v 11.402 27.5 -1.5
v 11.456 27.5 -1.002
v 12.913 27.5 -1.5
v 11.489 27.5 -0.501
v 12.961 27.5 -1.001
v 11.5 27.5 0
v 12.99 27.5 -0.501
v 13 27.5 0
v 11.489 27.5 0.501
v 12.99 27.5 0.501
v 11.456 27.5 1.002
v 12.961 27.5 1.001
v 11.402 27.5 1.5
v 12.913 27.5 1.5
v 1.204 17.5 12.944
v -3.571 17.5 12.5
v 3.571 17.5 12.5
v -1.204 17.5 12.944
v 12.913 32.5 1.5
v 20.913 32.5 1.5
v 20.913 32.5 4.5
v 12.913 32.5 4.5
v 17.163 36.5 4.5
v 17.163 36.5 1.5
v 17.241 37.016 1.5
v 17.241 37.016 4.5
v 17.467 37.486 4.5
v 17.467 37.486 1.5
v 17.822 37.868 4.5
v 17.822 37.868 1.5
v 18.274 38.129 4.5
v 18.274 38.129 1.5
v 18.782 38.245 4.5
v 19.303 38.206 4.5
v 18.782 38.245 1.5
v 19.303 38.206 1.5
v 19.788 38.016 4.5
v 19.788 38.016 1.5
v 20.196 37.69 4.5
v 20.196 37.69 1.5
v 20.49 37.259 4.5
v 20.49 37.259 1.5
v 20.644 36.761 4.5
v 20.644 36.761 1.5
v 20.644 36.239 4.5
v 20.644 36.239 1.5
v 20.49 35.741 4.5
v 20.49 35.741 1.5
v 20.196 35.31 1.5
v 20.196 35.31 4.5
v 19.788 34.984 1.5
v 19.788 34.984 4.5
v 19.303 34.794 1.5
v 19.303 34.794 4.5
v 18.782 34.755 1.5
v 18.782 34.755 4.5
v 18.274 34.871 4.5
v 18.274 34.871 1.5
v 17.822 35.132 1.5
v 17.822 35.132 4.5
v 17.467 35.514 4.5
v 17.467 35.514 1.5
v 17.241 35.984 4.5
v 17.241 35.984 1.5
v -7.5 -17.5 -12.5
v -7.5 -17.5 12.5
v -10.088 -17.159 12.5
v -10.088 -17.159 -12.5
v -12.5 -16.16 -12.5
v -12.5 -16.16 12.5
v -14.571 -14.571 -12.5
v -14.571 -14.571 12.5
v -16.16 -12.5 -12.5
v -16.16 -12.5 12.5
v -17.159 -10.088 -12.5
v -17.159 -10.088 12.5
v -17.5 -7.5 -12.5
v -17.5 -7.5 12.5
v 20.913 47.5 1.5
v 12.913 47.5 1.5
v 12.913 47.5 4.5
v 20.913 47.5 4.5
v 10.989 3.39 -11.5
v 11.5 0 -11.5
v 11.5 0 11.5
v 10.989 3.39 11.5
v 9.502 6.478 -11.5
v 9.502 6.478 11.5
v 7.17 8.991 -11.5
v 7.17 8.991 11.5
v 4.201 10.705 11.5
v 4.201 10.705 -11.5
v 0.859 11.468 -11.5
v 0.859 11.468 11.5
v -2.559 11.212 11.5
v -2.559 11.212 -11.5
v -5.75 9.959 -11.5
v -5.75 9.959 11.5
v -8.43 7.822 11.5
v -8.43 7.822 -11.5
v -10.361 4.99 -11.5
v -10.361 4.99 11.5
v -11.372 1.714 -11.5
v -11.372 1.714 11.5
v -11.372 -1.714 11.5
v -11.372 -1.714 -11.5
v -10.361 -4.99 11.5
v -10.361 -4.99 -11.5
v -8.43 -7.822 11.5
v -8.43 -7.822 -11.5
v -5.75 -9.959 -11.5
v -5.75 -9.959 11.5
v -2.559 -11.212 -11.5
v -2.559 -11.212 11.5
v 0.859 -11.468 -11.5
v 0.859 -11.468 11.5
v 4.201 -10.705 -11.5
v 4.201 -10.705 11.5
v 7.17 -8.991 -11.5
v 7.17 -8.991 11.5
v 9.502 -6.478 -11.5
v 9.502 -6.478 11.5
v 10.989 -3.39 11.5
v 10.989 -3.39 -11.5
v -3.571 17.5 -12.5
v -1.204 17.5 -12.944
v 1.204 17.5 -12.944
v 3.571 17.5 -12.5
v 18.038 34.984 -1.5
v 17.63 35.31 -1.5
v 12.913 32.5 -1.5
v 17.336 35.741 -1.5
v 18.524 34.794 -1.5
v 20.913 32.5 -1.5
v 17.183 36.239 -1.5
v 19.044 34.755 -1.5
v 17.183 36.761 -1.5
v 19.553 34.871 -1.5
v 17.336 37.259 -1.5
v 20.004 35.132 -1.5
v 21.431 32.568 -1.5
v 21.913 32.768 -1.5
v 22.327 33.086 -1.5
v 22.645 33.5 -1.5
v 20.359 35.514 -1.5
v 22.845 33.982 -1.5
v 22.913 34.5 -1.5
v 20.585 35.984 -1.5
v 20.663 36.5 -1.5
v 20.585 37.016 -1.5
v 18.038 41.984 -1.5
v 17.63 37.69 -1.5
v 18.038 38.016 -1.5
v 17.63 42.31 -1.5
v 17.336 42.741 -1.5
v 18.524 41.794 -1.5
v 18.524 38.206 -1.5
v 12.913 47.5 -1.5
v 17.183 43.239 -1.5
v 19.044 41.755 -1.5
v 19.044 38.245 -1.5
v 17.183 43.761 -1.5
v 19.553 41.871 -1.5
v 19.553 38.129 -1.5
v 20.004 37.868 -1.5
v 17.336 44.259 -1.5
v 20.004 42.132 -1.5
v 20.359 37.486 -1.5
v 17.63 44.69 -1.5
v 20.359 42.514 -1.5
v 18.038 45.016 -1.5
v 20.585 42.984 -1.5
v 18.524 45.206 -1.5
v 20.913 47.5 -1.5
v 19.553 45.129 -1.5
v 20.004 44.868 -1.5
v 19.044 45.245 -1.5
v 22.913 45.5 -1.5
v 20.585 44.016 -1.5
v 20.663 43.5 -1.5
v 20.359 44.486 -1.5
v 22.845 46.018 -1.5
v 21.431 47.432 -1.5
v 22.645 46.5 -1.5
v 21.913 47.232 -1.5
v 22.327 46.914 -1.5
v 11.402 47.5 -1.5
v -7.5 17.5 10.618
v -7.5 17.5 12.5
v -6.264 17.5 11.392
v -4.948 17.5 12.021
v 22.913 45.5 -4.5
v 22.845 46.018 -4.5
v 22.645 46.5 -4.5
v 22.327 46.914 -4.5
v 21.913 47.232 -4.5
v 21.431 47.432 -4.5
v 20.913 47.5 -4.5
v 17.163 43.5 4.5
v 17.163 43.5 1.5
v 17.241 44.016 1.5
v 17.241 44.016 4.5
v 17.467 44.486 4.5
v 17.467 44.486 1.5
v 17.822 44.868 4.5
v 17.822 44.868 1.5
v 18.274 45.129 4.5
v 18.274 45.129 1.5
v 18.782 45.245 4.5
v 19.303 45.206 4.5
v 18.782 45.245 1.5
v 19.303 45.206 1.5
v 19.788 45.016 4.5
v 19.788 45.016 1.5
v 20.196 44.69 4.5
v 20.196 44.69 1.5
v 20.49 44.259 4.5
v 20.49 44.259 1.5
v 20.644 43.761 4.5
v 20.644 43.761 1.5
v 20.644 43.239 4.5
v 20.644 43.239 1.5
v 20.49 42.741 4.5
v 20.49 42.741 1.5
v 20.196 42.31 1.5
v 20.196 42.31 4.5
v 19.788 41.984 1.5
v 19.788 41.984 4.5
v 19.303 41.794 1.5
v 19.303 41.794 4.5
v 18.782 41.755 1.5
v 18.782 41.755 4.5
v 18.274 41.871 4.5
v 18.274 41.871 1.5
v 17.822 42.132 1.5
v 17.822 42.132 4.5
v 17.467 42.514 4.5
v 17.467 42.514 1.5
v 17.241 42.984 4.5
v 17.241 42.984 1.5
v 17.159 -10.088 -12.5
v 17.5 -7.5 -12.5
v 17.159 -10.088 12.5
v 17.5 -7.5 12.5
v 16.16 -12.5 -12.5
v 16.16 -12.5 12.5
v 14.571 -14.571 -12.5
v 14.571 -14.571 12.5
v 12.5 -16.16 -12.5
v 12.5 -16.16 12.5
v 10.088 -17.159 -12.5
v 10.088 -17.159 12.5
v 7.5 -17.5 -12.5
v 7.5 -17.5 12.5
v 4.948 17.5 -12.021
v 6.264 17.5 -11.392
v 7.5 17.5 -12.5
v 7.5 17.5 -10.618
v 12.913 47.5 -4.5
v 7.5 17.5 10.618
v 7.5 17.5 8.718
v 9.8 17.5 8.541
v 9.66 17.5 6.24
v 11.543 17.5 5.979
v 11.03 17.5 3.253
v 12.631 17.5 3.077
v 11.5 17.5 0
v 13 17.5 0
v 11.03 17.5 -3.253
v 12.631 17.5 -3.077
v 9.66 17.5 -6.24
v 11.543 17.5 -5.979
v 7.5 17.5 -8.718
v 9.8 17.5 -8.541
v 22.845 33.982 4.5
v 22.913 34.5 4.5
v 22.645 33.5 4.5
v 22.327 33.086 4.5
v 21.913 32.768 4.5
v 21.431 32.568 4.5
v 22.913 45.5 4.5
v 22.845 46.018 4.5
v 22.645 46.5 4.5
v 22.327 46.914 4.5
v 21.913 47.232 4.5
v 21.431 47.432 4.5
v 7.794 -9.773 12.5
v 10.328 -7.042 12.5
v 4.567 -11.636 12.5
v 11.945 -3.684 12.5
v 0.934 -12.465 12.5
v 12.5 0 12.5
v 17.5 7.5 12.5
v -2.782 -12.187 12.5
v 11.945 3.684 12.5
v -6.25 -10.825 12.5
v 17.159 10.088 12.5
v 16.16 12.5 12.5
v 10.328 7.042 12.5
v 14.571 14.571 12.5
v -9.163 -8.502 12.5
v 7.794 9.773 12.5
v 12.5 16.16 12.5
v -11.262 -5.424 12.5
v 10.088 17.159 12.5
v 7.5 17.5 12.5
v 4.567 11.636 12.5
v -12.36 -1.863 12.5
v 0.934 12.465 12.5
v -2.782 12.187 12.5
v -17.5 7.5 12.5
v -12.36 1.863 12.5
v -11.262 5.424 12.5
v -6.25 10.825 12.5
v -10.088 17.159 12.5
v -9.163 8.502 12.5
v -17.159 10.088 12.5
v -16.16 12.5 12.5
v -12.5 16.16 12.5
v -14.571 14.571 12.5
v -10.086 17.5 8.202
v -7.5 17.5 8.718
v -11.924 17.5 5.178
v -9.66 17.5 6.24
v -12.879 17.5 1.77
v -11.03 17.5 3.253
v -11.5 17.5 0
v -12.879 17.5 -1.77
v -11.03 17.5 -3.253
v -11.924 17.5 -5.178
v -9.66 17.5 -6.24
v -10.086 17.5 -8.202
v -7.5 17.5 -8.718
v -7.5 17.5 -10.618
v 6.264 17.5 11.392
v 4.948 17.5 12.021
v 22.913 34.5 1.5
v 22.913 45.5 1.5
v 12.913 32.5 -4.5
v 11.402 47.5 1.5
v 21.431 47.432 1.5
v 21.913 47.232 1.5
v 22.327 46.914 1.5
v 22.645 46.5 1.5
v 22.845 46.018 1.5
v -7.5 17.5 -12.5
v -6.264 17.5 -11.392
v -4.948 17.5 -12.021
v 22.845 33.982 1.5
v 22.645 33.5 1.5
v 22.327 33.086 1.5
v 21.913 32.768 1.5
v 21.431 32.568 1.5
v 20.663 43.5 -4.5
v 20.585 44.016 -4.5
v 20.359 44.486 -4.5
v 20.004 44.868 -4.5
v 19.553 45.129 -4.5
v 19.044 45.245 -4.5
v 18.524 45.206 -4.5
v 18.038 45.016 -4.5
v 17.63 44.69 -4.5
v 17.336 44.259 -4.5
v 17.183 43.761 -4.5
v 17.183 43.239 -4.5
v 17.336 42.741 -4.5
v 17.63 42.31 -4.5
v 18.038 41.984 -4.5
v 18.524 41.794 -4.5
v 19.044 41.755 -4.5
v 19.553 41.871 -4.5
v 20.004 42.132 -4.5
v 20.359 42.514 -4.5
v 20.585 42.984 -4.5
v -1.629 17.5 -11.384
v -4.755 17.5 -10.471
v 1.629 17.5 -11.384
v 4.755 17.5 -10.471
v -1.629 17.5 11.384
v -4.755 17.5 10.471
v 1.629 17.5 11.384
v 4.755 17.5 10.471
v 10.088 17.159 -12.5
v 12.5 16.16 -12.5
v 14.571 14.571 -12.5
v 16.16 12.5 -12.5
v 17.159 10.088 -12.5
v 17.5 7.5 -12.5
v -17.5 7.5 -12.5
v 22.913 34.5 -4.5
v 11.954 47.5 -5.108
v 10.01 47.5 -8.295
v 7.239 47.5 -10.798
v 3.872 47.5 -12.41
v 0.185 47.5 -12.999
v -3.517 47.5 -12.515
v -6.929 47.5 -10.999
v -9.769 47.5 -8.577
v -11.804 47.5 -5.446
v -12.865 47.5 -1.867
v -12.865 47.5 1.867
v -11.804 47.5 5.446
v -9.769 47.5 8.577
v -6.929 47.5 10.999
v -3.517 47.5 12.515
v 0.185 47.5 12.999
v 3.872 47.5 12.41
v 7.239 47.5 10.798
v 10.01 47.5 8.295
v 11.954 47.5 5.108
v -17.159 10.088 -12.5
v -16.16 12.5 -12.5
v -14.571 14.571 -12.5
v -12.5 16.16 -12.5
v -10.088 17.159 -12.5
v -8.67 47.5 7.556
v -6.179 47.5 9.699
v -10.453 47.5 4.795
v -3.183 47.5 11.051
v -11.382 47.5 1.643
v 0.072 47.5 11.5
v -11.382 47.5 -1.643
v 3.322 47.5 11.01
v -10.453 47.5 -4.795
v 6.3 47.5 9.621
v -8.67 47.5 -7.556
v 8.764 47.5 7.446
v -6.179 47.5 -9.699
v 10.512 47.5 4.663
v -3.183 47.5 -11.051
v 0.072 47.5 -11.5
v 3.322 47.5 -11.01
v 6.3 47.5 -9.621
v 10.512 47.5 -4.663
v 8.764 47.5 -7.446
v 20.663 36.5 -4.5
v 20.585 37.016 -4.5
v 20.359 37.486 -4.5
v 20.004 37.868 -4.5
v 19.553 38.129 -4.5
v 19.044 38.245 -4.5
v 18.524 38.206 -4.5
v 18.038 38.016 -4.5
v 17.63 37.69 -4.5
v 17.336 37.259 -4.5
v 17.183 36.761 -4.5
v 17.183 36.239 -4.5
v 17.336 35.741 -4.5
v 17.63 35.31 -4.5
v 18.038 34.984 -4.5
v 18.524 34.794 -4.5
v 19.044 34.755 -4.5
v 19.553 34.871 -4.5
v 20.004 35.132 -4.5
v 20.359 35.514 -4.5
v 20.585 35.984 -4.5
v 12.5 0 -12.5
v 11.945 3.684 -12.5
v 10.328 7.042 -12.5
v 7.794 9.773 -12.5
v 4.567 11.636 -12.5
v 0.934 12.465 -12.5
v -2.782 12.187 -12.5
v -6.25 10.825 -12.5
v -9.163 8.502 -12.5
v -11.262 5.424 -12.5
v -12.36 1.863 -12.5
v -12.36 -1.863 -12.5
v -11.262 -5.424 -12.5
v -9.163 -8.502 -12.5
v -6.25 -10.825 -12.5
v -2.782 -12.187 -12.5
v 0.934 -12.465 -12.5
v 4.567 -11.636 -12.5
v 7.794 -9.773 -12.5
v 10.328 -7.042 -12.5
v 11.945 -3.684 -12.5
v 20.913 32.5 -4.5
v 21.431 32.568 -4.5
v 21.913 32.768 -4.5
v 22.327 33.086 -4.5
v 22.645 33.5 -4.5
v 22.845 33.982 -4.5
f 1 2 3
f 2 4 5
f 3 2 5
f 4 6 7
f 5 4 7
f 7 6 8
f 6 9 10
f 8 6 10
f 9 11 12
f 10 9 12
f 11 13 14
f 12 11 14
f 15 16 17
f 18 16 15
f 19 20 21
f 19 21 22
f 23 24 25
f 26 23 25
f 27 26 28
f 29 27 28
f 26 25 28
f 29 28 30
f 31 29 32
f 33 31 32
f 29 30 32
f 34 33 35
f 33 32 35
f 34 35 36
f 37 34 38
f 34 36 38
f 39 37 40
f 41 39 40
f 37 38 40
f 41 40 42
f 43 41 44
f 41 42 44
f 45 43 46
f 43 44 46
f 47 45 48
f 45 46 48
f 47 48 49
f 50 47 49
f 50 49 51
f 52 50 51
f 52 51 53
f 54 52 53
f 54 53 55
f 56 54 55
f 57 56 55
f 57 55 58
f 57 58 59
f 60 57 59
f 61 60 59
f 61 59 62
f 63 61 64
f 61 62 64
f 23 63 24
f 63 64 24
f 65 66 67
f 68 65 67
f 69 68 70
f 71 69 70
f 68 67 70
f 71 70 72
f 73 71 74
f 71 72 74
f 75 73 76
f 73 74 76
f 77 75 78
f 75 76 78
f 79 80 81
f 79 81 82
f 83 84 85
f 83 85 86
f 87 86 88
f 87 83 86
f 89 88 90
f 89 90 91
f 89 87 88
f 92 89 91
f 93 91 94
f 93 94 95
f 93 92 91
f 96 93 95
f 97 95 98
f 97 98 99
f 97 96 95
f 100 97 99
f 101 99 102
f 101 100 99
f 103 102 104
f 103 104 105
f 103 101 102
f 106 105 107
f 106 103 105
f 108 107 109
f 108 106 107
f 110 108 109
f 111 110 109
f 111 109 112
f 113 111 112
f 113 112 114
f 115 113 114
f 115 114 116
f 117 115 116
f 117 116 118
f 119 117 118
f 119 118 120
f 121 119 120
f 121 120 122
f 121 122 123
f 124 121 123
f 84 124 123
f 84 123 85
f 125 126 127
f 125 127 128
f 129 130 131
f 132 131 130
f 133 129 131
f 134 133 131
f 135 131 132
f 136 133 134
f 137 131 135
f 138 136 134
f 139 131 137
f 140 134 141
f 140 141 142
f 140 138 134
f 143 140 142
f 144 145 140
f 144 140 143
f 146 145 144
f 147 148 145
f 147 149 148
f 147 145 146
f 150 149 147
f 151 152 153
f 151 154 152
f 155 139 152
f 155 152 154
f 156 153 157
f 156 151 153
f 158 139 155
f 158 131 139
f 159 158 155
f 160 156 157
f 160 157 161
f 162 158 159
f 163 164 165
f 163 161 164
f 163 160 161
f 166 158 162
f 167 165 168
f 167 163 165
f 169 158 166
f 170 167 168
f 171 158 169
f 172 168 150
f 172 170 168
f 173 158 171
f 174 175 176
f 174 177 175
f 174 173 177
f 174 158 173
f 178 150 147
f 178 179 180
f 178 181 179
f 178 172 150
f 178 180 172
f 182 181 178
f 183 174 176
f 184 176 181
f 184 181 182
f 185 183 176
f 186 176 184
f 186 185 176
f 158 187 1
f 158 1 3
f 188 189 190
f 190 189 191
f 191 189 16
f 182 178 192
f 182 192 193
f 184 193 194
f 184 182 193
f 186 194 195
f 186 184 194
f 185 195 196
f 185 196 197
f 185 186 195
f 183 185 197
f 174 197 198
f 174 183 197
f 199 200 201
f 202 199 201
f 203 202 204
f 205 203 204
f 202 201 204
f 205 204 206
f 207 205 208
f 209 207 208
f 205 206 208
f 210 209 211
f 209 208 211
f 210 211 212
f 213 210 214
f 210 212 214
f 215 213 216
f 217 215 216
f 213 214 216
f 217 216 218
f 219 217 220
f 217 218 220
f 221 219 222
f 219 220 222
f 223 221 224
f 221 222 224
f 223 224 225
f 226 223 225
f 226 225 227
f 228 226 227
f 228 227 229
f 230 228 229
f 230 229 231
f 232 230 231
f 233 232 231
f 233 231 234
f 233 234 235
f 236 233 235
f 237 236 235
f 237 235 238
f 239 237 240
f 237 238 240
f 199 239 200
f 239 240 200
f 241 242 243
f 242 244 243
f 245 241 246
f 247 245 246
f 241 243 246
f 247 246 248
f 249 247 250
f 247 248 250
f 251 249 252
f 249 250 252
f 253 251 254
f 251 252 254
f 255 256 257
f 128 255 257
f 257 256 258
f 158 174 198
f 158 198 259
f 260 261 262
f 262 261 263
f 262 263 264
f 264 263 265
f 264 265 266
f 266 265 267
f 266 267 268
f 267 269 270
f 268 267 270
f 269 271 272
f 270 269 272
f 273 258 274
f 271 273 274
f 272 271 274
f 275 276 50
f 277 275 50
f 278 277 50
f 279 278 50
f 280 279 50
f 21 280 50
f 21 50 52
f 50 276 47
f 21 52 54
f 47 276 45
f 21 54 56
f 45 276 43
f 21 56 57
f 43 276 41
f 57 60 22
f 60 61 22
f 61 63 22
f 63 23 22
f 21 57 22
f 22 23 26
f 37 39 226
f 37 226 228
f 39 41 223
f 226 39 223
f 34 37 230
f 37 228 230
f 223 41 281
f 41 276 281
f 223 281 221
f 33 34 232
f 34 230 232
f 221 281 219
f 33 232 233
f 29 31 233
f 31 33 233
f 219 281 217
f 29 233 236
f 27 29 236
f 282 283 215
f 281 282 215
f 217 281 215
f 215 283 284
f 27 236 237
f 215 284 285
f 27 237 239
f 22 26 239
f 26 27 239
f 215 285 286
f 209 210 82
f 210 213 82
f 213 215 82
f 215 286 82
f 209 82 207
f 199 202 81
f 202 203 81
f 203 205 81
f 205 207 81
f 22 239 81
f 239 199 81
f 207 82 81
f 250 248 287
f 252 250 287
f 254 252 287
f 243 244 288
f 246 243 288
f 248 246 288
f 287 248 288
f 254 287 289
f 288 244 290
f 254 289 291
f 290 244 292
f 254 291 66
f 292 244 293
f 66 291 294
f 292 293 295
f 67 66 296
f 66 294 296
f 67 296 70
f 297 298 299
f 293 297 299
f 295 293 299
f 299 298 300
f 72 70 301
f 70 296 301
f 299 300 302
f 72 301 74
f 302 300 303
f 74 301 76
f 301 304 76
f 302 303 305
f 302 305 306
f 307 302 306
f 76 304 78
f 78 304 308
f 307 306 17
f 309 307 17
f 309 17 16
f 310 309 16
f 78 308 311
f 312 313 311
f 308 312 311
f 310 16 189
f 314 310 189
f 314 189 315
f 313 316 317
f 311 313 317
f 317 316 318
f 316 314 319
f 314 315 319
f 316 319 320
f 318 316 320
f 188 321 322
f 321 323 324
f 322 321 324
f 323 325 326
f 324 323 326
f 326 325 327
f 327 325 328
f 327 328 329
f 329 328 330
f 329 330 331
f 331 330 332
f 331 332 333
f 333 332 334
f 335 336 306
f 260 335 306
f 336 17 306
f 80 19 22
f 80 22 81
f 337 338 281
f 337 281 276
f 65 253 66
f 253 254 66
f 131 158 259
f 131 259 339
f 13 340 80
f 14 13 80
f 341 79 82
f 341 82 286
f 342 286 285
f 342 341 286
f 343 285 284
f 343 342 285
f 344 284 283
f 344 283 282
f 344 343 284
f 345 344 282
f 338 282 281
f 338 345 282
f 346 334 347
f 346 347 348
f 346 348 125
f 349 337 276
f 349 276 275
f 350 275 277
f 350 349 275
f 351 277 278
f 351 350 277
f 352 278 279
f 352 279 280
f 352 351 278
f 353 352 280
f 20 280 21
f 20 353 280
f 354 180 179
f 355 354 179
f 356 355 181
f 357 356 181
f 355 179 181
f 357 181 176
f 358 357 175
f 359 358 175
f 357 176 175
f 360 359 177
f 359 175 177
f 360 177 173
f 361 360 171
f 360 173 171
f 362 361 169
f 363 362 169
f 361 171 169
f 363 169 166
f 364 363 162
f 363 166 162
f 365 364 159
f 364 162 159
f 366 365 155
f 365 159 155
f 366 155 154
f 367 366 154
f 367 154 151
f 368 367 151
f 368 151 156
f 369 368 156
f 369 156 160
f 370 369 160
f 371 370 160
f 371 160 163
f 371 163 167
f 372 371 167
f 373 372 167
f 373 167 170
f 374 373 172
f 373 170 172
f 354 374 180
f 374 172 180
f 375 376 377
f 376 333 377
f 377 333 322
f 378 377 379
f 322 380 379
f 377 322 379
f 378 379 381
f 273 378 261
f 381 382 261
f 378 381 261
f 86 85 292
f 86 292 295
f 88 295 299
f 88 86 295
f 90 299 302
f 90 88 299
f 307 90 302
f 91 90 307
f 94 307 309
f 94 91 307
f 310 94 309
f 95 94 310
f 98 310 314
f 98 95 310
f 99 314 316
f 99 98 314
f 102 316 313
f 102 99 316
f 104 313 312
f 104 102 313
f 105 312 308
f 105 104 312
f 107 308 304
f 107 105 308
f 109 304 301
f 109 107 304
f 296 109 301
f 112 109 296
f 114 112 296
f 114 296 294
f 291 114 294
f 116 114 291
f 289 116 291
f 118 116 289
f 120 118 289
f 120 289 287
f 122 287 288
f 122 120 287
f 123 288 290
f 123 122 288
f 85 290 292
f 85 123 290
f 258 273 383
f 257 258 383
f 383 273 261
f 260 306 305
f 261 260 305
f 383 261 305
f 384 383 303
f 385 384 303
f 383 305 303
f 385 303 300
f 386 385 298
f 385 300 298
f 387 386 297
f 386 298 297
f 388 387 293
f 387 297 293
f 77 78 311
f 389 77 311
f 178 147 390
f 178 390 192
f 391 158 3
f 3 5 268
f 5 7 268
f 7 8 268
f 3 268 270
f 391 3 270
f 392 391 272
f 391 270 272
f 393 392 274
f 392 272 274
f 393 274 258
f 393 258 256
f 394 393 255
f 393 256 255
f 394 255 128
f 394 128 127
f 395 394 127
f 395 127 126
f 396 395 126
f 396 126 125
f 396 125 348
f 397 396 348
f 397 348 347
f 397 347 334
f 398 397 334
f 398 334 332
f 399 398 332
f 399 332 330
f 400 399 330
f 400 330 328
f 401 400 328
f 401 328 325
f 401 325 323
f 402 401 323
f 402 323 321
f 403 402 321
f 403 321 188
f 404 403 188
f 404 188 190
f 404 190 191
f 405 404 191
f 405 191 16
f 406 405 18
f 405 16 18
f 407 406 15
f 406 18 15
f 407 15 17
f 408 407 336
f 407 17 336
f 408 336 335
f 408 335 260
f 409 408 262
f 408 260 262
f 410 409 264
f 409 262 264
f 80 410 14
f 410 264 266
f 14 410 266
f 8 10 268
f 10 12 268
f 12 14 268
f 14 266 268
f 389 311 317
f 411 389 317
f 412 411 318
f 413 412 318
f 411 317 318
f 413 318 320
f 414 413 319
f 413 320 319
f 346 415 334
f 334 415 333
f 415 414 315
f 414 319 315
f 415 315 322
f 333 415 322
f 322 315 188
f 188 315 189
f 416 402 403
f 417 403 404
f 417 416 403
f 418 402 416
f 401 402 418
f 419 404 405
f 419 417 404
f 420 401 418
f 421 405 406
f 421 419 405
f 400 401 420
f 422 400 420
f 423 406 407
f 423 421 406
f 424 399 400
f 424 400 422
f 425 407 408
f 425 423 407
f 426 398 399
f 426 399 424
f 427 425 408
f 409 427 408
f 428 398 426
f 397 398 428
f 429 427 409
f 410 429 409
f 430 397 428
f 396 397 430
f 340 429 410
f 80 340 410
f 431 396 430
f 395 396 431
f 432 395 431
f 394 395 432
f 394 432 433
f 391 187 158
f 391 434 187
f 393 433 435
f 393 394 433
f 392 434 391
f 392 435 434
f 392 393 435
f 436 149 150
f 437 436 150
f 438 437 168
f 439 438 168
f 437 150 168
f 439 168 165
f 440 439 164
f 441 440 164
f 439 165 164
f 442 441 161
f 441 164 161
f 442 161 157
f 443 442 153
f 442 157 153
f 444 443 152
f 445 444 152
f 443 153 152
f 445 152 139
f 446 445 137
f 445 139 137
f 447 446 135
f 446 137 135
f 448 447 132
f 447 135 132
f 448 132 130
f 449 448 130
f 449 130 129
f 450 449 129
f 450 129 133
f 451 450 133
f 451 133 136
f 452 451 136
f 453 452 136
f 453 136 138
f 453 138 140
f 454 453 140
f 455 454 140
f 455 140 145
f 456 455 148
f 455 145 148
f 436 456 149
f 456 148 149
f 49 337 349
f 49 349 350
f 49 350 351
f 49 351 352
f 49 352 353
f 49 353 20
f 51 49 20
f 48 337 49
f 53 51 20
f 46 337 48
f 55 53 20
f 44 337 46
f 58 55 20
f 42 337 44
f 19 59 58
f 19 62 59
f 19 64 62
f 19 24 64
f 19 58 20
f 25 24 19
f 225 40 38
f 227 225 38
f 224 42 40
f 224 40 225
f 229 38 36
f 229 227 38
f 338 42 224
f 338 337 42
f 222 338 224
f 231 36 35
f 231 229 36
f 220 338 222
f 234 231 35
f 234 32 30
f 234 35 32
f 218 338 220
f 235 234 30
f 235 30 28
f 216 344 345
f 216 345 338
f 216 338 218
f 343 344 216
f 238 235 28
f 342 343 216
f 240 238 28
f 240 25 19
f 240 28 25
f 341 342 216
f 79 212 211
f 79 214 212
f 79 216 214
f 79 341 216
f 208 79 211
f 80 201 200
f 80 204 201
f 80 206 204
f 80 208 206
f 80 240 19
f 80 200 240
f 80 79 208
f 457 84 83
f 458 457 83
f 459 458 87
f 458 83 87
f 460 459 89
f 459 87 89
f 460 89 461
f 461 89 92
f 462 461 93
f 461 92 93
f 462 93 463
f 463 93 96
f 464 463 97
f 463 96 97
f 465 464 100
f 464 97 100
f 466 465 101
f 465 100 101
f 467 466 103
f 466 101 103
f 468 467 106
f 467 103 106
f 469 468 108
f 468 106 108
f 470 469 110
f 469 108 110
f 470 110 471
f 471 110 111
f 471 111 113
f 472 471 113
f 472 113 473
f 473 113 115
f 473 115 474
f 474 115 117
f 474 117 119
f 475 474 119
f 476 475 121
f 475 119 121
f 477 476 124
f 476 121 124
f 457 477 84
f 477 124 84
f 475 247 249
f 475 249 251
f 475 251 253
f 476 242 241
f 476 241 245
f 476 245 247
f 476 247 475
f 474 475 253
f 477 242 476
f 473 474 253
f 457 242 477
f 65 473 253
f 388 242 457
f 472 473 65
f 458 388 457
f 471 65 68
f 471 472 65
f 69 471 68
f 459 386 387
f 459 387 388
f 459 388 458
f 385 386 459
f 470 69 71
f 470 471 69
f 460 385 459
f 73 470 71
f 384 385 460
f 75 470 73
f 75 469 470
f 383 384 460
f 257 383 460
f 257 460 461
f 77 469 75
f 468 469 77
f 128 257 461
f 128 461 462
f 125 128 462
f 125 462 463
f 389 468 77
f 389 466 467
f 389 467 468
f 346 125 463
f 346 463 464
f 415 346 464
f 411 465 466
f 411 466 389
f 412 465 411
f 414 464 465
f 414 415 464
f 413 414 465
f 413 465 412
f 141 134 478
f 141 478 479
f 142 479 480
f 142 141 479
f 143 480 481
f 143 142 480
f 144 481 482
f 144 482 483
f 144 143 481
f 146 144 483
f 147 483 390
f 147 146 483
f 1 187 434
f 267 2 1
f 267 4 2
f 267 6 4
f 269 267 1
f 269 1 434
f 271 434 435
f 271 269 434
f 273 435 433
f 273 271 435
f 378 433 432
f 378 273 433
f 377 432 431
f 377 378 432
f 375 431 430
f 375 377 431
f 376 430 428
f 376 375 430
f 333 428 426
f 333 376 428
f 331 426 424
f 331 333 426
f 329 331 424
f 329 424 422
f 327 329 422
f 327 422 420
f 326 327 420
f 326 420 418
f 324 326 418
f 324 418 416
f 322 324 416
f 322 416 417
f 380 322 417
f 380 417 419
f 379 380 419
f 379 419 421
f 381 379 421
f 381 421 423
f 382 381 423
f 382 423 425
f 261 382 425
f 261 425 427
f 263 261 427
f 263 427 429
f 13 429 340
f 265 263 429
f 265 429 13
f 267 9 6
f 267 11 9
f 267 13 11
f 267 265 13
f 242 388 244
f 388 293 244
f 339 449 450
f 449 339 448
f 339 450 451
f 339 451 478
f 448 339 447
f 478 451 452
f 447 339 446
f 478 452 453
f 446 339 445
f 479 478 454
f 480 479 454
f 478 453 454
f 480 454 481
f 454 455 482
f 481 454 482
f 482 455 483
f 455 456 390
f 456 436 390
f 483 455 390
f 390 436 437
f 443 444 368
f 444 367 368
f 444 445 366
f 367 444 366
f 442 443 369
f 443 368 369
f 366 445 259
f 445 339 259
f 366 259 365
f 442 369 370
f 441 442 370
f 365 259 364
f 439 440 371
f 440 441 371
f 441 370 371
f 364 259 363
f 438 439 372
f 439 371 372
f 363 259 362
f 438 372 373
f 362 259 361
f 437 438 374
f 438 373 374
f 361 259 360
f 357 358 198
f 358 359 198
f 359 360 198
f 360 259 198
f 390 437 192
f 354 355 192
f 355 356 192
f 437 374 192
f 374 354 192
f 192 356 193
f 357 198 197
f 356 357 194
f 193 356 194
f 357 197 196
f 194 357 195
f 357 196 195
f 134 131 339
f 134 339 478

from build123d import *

# Parameters (mm, degrees)
SKETCH1_R           = 11.5
BOSS_EXTRUDE2_DEPTH = 12.5
SKETCH4_R           = 13
SKETCH4_R_2         = 11.5
BOSS_EXTRUDE3_DEPTH = 30
SKETCH5_W           = 11.805491749
SKETCH5_H           = 20
CUT_EXTRUDE1_DEPTH  = 1.5
SKETCH7_R           = 1.75
BOSS_EXTRUDE4_DEPTH = 3
SKETCH8_R           = 1.75
BOSS_EXTRUDE6_DEPTH = 3
CHAMFER1_SIZE       = 1


with BuildPart() as part:
    # Sketch1 → Boss-Extrude2 (new body, symmetric)
    with BuildSketch(Plane.XY):
        with BuildLine():
            Line((-7.5, 17.5), (7.5, 17.5))
            ThreePointArc((7.5, 17.5), (14.571067812, 14.571067812), (17.5, 7.5))
            Line((17.5, 7.5), (17.5, -7.5))
            ThreePointArc((17.5, -7.5), (14.571067812, -14.571067812), (7.5, -17.5))
            Line((7.5, -17.5), (-7.5, -17.5))
            ThreePointArc((-7.5, -17.5), (-14.571067812, -14.571067812), (-17.5, -7.5))
            Line((-17.5, -7.5), (-17.5, 7.5))
            ThreePointArc((-17.5, 7.5), (-14.571067812, 14.571067812), (-7.5, 17.5))
        make_face()
        Circle(SKETCH1_R, mode=Mode.SUBTRACT)
    extrude(amount=BOSS_EXTRUDE2_DEPTH, both=True)

    # Sketch4 → Boss-Extrude3 (add)
    with BuildSketch(Plane(origin=(0, 17.5, 0), x_dir=(1, 0, 0), z_dir=(0, 1, 0))):
        Circle(SKETCH4_R)
        Circle(SKETCH4_R_2, mode=Mode.SUBTRACT)
    extrude(amount=BOSS_EXTRUDE3_DEPTH)

    # Sketch5 → Cut-Extrude1 (cut, symmetric)
    with BuildSketch(Plane.XY):
        with Locations((11.85964538, 37.5)):
            Rectangle(SKETCH5_W, SKETCH5_H)
    extrude(amount=CUT_EXTRUDE1_DEPTH, both=True, mode=Mode.SUBTRACT)

    # Chamfer1
    chamfer1_edges = [part.edges().sort_by_distance(p)[0] for p in [
        (-11.5, 0, -12.5),
        (-11.5, 0, 12.5),
    ]]
    chamfer(chamfer1_edges, length=CHAMFER1_SIZE)


with BuildPart() as body_2:
    # Sketch7 → Boss-Extrude4 (new body)
    with BuildSketch(Plane(origin=(0, 0, 1.5), x_dir=(-1, 0, 0), z_dir=(0, 0, -1))):
        with BuildLine():
            Line((-12.91317157, 47.5), (-20.91317157, 47.5))
            ThreePointArc((-20.91317157, 47.5), (-22.327385133, 46.914213562), (-22.91317157, 45.5))
            Line((-22.91317157, 45.5), (-22.91317157, 34.5))
            ThreePointArc((-22.91317157, 34.5), (-22.327385133, 33.085786438), (-20.91317157, 32.5))
            Line((-20.91317157, 32.5), (-12.91317157, 32.5))
            Line((-12.91317157, 32.5), (-12.91317157, 47.5))
        make_face()
        with Locations((-18.91317157, 43.5)):
            Circle(SKETCH7_R, mode=Mode.SUBTRACT)
        with Locations((-18.91317157, 36.5)):
            Circle(SKETCH7_R, mode=Mode.SUBTRACT)
    extrude(amount=-BOSS_EXTRUDE4_DEPTH)


with BuildPart() as body_3:
    # Sketch8 → Boss-Extrude6 (new body)
    with BuildSketch(Plane.XY.offset(-1.5)):
        with BuildLine():
            Line((12.91317157, 47.5), (12.91317157, 32.5))
            Line((12.91317157, 32.5), (20.91317157, 32.5))
            ThreePointArc((20.91317157, 32.5), (22.327385133, 33.085786438), (22.91317157, 34.5))
            Line((22.91317157, 34.5), (22.91317157, 45.5))
            ThreePointArc((22.91317157, 45.5), (22.327385133, 46.914213562), (20.91317157, 47.5))
            Line((20.91317157, 47.5), (12.91317157, 47.5))
        make_face()
        with Locations((18.91317157, 36.5)):
            Circle(SKETCH8_R, mode=Mode.SUBTRACT)
        with Locations((18.91317157, 43.5)):
            Circle(SKETCH8_R, mode=Mode.SUBTRACT)
    extrude(amount=-BOSS_EXTRUDE6_DEPTH)


solid = Compound([part.part, body_2.part, body_3.part])
